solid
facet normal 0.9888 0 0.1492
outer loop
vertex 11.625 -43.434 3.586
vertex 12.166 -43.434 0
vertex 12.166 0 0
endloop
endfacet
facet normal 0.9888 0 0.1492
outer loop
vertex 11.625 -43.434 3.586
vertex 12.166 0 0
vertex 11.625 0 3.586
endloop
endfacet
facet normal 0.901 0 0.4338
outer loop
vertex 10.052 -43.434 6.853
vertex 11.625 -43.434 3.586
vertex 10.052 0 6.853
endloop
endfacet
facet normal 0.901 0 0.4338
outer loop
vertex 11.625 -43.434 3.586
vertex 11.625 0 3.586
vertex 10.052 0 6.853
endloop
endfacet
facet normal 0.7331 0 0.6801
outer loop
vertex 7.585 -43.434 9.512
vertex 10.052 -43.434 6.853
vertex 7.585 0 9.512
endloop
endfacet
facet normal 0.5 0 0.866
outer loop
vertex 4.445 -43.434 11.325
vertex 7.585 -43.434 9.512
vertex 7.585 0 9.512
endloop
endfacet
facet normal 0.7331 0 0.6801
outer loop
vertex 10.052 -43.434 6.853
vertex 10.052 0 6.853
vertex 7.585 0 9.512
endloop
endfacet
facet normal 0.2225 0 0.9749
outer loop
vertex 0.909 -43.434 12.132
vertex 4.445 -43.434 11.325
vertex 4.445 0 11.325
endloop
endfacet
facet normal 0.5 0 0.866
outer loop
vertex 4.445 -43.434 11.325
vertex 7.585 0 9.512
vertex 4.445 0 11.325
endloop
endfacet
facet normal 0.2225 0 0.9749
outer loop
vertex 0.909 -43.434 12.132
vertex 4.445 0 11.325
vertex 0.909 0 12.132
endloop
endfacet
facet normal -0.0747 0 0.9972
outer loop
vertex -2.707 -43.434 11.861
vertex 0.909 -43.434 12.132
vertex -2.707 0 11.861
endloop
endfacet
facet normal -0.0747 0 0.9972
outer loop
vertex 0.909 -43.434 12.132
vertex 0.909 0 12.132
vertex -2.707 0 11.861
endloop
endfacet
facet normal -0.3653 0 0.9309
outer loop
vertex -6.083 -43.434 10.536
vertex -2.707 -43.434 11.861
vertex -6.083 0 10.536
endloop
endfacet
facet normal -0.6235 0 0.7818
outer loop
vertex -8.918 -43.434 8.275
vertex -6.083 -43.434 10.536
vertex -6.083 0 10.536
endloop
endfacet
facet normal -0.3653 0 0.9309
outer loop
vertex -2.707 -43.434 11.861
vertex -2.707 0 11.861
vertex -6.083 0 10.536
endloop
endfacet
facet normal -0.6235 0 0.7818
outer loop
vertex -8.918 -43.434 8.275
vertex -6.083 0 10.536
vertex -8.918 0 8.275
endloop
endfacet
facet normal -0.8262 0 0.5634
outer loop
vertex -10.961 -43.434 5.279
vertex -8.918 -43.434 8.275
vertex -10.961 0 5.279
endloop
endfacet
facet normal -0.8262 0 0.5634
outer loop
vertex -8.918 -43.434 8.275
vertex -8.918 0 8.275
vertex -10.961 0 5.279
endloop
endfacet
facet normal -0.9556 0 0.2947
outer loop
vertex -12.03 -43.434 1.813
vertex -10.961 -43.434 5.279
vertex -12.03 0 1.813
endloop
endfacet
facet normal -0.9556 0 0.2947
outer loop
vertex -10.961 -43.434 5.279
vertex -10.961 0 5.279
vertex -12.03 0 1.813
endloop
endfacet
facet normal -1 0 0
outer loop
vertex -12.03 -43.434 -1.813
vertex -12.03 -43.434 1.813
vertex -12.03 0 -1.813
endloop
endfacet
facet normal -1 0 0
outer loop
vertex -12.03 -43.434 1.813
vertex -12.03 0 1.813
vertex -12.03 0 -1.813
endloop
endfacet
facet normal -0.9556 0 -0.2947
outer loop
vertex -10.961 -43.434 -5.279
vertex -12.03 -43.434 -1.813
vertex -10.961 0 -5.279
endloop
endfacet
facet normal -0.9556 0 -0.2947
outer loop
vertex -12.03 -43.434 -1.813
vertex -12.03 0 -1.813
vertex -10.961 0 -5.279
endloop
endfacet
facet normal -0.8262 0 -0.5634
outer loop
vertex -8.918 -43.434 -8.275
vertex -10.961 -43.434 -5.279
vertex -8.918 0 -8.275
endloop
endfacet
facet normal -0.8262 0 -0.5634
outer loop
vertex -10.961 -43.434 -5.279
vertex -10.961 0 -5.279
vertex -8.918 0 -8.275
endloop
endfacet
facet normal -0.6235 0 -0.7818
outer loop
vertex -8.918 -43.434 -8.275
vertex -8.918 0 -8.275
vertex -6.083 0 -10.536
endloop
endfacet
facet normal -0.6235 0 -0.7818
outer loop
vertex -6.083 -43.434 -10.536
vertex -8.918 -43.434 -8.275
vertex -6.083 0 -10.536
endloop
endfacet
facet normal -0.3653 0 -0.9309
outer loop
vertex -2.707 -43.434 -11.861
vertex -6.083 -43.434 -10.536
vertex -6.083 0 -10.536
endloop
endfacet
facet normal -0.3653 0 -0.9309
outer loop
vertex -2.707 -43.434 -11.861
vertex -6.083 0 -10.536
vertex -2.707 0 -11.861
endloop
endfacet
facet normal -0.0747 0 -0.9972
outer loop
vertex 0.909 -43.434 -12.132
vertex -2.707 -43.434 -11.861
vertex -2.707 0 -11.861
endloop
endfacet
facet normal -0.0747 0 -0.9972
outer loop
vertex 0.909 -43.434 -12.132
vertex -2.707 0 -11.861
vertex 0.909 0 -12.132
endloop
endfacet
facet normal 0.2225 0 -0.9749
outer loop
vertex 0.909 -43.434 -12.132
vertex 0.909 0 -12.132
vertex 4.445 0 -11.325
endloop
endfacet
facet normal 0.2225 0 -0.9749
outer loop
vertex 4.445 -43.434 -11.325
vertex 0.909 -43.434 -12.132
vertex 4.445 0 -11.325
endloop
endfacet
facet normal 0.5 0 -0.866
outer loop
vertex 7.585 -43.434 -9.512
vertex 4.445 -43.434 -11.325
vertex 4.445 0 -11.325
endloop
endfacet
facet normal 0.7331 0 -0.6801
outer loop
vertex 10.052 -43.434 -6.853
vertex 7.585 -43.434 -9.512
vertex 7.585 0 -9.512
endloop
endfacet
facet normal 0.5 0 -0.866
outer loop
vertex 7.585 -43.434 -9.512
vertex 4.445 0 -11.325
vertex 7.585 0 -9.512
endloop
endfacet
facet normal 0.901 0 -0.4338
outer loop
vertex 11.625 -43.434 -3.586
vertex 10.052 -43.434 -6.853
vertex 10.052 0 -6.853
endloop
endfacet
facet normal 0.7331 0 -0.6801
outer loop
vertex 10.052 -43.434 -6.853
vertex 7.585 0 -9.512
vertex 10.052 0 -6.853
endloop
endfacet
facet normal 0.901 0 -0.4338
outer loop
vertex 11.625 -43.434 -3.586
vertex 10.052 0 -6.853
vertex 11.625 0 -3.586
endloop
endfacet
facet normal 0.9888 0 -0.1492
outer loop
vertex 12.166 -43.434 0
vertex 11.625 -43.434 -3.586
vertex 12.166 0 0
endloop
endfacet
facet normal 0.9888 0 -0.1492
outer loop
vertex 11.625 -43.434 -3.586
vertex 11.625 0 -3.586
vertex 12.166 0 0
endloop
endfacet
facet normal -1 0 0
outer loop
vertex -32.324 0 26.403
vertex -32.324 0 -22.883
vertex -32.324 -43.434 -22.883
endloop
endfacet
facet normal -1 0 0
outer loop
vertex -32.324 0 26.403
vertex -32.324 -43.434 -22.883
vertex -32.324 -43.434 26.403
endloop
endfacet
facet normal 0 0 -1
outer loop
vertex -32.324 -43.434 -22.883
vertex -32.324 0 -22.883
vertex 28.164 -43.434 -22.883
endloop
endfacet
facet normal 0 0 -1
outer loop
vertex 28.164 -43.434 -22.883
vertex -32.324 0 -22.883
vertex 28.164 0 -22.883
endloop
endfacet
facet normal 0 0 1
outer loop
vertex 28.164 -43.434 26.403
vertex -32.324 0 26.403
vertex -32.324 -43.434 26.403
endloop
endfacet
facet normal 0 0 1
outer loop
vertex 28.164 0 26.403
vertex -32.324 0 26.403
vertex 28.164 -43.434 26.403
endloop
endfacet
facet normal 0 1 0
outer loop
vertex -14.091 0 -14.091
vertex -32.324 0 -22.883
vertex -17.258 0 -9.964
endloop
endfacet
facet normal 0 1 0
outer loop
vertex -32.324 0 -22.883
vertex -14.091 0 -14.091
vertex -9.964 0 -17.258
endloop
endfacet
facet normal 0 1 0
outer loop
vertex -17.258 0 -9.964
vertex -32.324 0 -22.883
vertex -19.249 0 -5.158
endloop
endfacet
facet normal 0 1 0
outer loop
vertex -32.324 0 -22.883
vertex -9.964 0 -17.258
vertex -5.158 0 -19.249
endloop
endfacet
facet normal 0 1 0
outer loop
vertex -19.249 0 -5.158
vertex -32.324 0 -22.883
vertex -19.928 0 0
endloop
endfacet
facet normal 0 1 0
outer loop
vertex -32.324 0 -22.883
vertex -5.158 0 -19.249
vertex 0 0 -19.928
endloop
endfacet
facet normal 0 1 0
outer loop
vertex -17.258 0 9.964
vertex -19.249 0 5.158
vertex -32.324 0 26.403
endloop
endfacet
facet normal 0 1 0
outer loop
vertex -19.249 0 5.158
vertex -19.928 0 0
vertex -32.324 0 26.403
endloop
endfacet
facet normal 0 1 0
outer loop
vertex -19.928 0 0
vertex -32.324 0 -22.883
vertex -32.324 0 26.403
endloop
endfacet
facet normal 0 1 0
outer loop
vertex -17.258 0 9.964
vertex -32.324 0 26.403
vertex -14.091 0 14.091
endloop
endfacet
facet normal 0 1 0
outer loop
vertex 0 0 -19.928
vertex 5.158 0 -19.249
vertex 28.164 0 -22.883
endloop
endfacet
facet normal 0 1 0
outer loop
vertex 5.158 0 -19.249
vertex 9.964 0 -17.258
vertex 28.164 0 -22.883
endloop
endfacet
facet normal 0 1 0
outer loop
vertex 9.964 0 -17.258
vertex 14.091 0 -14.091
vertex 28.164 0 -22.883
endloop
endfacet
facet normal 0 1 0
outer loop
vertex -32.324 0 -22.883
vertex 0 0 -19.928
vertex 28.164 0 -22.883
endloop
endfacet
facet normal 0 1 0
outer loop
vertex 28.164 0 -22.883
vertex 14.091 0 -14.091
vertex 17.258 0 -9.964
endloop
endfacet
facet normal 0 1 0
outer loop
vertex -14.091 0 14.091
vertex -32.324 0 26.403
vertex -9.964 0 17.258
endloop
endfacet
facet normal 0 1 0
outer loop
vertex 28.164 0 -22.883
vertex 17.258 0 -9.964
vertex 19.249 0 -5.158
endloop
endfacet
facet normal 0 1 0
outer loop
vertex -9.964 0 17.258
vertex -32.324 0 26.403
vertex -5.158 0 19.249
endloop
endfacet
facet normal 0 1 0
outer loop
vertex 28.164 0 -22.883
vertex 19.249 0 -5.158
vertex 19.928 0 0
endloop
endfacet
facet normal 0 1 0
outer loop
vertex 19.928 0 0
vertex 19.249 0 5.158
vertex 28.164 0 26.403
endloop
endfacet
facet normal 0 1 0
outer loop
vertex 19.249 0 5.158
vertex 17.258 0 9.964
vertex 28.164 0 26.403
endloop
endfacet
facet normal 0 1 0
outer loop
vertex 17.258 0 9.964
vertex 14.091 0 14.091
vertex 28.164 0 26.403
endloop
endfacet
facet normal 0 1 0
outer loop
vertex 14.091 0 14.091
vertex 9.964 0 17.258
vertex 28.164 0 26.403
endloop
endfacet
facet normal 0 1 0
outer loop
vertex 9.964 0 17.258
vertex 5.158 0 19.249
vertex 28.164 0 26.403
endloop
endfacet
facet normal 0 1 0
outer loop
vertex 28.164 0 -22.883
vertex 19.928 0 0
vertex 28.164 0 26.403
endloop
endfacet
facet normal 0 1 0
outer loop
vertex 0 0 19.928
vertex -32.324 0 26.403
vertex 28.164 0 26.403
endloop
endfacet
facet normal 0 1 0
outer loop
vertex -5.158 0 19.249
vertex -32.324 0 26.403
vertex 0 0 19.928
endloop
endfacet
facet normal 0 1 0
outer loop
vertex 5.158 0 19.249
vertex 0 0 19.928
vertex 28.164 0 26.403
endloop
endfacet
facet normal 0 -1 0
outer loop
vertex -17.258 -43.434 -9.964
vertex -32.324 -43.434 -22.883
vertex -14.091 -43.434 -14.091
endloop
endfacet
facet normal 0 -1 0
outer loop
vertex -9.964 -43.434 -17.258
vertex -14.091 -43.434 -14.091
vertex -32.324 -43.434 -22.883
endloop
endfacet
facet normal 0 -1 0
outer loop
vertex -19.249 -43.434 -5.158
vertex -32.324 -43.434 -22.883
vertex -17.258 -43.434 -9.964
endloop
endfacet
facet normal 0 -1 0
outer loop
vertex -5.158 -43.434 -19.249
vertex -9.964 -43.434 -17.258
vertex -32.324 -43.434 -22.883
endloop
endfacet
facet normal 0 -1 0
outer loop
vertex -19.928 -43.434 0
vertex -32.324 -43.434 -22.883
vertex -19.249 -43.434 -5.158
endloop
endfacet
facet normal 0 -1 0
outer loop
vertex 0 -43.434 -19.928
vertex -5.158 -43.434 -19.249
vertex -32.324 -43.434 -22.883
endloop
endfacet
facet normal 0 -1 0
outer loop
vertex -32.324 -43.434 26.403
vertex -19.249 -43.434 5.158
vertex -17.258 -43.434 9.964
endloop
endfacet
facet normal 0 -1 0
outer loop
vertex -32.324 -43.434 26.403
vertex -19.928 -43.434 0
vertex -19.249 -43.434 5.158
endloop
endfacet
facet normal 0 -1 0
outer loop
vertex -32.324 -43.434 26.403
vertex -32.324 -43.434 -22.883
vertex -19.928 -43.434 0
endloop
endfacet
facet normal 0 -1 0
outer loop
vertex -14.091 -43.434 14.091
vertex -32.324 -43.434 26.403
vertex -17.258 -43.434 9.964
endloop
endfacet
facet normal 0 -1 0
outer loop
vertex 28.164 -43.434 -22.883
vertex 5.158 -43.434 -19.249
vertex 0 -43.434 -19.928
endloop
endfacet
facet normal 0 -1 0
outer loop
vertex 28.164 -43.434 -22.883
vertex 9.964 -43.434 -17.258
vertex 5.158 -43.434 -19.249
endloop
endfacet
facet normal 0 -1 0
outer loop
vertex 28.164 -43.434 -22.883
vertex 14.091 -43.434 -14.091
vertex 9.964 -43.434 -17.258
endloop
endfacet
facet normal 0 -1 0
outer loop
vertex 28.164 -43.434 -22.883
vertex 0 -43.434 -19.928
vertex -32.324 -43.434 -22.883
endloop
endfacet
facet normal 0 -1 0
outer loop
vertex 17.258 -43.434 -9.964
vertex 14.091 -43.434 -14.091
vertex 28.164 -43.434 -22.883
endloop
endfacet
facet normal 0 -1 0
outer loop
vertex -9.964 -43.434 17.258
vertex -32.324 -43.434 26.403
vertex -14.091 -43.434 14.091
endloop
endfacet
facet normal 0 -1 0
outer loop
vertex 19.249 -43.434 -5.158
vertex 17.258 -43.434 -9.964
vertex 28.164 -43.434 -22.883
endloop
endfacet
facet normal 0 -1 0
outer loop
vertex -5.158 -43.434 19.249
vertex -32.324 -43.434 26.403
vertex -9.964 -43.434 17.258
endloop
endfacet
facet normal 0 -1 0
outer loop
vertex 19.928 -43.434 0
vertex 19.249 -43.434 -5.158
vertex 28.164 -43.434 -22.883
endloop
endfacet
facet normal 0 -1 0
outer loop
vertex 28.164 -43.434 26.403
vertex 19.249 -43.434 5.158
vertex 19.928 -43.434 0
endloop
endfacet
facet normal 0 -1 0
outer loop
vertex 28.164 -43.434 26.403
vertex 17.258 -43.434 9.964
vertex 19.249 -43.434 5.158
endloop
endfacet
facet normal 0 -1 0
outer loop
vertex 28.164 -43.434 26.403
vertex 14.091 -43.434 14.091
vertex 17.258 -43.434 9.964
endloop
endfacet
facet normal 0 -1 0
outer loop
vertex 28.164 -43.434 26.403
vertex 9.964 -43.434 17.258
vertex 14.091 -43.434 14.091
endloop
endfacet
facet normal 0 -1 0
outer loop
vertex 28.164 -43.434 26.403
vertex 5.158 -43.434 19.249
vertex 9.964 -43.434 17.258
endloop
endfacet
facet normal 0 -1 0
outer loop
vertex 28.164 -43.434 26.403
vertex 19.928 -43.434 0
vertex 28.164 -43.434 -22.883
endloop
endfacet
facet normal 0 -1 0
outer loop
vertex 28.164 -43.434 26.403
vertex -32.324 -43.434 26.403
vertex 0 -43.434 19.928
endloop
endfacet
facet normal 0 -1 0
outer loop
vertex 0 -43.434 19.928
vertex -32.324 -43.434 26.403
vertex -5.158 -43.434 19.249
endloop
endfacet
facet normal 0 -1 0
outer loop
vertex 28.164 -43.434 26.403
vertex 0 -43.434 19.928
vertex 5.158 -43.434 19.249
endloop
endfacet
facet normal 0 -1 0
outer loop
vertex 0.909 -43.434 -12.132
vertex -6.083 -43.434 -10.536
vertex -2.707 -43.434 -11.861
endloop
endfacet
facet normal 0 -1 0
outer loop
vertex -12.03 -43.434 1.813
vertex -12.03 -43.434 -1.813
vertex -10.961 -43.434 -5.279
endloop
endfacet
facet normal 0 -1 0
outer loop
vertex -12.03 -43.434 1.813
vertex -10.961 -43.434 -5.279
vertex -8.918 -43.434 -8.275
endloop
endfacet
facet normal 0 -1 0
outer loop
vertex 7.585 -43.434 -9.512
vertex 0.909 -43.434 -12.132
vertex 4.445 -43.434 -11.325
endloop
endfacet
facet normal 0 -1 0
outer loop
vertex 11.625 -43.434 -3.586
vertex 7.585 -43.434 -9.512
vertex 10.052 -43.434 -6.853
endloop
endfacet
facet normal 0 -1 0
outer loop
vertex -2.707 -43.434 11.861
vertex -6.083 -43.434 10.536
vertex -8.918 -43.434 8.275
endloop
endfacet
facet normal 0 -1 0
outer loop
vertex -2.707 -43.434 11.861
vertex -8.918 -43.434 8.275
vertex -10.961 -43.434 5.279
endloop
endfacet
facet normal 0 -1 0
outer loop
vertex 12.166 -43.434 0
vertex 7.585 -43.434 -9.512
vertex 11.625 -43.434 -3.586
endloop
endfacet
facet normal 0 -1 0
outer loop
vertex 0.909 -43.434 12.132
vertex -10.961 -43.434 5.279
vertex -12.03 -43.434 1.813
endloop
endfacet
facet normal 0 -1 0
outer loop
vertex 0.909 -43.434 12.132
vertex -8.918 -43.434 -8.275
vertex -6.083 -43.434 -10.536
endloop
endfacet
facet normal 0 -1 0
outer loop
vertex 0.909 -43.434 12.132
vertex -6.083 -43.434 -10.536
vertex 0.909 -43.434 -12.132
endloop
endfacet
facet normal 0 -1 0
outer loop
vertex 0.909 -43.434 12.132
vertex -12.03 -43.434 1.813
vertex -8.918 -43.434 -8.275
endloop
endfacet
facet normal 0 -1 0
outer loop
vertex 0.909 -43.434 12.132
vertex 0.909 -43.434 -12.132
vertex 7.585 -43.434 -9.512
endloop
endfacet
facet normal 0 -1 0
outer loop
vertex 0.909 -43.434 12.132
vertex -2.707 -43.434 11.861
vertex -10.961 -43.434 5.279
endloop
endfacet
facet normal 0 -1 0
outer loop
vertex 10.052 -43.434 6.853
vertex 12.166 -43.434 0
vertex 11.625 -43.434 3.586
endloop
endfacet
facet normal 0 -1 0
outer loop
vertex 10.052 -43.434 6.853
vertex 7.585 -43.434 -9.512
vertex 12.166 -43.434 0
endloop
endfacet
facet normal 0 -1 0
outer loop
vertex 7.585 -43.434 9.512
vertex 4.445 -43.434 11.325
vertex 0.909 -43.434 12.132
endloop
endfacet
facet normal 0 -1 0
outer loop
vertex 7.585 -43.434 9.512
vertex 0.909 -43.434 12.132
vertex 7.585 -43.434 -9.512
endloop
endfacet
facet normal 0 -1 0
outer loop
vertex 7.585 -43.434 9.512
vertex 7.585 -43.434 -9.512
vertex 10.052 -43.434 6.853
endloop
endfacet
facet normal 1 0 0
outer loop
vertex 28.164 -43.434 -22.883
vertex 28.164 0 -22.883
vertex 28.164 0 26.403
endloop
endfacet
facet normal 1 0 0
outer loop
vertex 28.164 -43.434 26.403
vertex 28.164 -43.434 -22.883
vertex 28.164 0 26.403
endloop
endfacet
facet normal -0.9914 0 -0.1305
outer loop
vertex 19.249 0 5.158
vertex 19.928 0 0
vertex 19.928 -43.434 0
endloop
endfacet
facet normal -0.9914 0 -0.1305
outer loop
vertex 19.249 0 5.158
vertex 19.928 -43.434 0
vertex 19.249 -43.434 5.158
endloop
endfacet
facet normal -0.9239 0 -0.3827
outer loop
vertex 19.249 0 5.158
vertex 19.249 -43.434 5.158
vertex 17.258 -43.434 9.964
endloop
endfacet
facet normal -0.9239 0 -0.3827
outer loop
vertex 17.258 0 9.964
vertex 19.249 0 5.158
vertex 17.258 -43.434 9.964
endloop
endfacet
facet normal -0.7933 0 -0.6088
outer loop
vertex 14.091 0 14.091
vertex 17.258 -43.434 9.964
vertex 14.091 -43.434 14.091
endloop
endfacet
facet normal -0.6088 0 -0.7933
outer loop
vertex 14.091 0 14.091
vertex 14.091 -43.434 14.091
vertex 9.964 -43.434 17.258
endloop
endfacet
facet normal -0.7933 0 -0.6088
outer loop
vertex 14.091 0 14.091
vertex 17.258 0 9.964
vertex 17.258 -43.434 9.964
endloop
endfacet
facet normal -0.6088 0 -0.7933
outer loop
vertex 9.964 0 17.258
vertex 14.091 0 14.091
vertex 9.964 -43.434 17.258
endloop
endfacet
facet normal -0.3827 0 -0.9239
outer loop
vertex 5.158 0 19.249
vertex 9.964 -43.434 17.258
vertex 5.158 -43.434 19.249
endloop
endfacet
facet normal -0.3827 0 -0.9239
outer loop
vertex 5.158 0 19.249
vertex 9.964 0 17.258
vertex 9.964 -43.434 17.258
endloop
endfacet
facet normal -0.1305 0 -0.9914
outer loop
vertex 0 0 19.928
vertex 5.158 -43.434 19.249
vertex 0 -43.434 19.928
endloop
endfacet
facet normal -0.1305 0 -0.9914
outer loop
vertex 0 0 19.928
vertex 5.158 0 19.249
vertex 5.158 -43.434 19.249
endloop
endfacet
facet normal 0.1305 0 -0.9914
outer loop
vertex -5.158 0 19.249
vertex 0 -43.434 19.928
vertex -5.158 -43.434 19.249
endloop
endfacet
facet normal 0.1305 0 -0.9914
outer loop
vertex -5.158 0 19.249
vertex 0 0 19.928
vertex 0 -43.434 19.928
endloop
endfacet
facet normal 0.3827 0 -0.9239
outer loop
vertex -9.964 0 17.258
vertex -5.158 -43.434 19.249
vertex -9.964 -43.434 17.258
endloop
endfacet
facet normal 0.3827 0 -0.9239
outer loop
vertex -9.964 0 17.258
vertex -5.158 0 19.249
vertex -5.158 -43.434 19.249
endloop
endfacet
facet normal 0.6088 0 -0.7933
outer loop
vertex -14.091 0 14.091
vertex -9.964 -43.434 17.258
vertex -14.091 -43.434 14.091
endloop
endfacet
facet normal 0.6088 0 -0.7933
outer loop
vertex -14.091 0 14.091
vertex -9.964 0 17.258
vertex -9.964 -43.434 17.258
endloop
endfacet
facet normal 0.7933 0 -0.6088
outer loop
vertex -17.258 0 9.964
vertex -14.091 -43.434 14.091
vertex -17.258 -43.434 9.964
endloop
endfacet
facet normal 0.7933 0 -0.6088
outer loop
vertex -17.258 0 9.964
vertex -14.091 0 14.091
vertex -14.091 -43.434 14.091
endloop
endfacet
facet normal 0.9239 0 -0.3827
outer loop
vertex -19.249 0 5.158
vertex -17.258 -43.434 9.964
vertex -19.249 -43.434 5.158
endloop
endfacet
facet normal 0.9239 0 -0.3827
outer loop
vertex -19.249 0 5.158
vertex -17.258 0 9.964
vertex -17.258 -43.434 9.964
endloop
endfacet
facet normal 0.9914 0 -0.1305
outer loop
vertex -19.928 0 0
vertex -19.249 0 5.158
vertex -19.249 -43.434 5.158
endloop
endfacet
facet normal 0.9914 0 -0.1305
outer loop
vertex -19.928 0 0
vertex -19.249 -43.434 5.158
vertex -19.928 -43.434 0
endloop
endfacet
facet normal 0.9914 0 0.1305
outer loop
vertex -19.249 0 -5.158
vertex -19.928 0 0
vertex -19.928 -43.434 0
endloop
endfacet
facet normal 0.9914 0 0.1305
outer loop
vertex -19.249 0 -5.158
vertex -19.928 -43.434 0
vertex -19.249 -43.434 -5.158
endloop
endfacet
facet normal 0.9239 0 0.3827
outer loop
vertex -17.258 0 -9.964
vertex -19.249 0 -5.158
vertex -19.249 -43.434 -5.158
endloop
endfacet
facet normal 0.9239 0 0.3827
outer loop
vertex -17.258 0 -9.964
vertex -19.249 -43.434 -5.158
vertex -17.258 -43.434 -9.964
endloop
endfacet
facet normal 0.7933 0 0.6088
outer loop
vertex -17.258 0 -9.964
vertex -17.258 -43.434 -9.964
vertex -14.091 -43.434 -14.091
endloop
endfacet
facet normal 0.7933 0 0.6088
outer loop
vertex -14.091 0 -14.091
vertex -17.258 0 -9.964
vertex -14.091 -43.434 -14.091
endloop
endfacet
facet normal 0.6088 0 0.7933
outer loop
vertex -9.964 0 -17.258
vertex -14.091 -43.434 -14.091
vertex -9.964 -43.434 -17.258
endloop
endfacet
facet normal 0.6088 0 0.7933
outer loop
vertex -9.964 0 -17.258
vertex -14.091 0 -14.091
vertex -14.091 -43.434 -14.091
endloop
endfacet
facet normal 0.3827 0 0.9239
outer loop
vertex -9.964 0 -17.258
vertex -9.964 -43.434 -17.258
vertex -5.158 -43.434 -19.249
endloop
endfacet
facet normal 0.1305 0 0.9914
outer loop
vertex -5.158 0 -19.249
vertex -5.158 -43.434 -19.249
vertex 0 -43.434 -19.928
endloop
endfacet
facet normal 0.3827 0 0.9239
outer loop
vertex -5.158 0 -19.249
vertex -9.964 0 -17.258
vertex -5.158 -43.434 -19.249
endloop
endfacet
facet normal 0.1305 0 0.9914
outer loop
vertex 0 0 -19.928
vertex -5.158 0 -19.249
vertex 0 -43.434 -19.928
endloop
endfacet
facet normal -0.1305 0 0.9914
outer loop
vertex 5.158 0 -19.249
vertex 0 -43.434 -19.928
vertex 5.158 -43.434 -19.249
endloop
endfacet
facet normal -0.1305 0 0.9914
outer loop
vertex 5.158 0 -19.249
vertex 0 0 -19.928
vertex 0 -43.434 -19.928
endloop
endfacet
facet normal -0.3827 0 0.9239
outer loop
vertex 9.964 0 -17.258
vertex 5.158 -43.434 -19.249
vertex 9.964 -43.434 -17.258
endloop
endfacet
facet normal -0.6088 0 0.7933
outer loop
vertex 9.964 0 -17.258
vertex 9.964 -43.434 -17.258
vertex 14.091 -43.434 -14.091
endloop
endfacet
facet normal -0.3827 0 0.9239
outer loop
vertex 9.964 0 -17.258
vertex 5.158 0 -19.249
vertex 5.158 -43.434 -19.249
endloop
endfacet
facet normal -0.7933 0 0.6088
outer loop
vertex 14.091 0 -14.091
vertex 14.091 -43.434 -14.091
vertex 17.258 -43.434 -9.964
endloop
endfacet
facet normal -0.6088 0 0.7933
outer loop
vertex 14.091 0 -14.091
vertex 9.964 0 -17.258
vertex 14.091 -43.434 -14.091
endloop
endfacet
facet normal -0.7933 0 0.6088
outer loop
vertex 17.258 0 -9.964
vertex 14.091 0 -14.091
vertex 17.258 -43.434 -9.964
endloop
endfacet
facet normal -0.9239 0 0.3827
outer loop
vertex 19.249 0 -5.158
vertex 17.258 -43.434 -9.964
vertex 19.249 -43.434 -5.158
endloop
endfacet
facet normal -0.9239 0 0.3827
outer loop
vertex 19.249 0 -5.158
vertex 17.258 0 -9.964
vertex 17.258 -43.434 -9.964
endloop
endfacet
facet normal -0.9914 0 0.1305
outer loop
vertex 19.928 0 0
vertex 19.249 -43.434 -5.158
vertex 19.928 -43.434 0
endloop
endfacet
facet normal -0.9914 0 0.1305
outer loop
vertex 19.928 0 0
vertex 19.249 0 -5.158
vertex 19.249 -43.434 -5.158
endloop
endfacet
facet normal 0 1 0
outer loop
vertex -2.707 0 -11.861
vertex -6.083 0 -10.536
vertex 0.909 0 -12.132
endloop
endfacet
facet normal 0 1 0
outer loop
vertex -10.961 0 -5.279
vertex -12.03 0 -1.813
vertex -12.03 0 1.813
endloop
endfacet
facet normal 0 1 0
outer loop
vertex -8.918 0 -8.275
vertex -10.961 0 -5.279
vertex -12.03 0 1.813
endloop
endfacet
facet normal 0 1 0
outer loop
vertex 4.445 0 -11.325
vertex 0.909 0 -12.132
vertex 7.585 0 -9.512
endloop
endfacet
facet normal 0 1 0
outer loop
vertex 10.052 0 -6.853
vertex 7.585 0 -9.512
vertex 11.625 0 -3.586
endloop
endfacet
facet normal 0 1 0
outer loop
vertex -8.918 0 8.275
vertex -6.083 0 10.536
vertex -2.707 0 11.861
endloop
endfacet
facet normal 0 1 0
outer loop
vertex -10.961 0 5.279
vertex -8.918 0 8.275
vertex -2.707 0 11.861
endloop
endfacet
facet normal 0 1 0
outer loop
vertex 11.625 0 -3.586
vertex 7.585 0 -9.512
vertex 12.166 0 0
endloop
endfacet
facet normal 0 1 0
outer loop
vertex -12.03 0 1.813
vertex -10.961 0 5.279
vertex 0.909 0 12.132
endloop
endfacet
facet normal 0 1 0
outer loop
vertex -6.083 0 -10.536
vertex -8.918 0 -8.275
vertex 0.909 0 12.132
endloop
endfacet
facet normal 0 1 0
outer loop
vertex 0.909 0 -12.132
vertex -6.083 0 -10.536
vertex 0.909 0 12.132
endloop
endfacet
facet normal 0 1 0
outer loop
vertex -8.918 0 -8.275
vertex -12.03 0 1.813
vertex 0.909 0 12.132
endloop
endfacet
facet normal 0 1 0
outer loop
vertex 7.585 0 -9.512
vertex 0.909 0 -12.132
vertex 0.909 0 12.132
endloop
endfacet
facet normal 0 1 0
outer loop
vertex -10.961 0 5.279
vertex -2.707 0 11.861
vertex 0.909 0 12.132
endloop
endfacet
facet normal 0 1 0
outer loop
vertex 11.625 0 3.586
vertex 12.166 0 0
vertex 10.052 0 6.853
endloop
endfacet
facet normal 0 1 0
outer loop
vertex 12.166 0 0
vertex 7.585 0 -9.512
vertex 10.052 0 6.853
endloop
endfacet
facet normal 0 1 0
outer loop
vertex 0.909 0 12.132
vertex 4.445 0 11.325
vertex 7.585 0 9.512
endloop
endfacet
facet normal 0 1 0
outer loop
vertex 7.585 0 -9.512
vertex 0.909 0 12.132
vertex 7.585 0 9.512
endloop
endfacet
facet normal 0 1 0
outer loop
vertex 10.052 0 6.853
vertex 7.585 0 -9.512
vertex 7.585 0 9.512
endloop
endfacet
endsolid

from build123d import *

# Parameters (mm, degrees)
F0_W     = 60.4875590652
F0_H     = 49.2861624807
F0_R     = 19.9281126129
F1_DEPTH = 43.434
F0_R_2   = 12.1657306008


# Not quite as in the source:
# - the program builds the solid bodies; features that only make, move or delete a surface that nothing else refers to are left out


with BuildPart() as f1:
    # F0 (on Front) → F1 (new body)
    with BuildSketch(Plane.XZ):
        with Locations((-2.0802589133, 1.7602192238)):
            Rectangle(F0_W, F0_H)
        Circle(F0_R, mode=Mode.SUBTRACT)
    extrude(amount=F1_DEPTH)


with BuildPart() as f1b:
    # F0 (on Front) → F1, piece 2 (new body)
    with BuildSketch(Plane.XZ):
        Circle(F0_R_2)
    extrude(amount=F1_DEPTH)


solid = Compound([f1.part, f1b.part])
